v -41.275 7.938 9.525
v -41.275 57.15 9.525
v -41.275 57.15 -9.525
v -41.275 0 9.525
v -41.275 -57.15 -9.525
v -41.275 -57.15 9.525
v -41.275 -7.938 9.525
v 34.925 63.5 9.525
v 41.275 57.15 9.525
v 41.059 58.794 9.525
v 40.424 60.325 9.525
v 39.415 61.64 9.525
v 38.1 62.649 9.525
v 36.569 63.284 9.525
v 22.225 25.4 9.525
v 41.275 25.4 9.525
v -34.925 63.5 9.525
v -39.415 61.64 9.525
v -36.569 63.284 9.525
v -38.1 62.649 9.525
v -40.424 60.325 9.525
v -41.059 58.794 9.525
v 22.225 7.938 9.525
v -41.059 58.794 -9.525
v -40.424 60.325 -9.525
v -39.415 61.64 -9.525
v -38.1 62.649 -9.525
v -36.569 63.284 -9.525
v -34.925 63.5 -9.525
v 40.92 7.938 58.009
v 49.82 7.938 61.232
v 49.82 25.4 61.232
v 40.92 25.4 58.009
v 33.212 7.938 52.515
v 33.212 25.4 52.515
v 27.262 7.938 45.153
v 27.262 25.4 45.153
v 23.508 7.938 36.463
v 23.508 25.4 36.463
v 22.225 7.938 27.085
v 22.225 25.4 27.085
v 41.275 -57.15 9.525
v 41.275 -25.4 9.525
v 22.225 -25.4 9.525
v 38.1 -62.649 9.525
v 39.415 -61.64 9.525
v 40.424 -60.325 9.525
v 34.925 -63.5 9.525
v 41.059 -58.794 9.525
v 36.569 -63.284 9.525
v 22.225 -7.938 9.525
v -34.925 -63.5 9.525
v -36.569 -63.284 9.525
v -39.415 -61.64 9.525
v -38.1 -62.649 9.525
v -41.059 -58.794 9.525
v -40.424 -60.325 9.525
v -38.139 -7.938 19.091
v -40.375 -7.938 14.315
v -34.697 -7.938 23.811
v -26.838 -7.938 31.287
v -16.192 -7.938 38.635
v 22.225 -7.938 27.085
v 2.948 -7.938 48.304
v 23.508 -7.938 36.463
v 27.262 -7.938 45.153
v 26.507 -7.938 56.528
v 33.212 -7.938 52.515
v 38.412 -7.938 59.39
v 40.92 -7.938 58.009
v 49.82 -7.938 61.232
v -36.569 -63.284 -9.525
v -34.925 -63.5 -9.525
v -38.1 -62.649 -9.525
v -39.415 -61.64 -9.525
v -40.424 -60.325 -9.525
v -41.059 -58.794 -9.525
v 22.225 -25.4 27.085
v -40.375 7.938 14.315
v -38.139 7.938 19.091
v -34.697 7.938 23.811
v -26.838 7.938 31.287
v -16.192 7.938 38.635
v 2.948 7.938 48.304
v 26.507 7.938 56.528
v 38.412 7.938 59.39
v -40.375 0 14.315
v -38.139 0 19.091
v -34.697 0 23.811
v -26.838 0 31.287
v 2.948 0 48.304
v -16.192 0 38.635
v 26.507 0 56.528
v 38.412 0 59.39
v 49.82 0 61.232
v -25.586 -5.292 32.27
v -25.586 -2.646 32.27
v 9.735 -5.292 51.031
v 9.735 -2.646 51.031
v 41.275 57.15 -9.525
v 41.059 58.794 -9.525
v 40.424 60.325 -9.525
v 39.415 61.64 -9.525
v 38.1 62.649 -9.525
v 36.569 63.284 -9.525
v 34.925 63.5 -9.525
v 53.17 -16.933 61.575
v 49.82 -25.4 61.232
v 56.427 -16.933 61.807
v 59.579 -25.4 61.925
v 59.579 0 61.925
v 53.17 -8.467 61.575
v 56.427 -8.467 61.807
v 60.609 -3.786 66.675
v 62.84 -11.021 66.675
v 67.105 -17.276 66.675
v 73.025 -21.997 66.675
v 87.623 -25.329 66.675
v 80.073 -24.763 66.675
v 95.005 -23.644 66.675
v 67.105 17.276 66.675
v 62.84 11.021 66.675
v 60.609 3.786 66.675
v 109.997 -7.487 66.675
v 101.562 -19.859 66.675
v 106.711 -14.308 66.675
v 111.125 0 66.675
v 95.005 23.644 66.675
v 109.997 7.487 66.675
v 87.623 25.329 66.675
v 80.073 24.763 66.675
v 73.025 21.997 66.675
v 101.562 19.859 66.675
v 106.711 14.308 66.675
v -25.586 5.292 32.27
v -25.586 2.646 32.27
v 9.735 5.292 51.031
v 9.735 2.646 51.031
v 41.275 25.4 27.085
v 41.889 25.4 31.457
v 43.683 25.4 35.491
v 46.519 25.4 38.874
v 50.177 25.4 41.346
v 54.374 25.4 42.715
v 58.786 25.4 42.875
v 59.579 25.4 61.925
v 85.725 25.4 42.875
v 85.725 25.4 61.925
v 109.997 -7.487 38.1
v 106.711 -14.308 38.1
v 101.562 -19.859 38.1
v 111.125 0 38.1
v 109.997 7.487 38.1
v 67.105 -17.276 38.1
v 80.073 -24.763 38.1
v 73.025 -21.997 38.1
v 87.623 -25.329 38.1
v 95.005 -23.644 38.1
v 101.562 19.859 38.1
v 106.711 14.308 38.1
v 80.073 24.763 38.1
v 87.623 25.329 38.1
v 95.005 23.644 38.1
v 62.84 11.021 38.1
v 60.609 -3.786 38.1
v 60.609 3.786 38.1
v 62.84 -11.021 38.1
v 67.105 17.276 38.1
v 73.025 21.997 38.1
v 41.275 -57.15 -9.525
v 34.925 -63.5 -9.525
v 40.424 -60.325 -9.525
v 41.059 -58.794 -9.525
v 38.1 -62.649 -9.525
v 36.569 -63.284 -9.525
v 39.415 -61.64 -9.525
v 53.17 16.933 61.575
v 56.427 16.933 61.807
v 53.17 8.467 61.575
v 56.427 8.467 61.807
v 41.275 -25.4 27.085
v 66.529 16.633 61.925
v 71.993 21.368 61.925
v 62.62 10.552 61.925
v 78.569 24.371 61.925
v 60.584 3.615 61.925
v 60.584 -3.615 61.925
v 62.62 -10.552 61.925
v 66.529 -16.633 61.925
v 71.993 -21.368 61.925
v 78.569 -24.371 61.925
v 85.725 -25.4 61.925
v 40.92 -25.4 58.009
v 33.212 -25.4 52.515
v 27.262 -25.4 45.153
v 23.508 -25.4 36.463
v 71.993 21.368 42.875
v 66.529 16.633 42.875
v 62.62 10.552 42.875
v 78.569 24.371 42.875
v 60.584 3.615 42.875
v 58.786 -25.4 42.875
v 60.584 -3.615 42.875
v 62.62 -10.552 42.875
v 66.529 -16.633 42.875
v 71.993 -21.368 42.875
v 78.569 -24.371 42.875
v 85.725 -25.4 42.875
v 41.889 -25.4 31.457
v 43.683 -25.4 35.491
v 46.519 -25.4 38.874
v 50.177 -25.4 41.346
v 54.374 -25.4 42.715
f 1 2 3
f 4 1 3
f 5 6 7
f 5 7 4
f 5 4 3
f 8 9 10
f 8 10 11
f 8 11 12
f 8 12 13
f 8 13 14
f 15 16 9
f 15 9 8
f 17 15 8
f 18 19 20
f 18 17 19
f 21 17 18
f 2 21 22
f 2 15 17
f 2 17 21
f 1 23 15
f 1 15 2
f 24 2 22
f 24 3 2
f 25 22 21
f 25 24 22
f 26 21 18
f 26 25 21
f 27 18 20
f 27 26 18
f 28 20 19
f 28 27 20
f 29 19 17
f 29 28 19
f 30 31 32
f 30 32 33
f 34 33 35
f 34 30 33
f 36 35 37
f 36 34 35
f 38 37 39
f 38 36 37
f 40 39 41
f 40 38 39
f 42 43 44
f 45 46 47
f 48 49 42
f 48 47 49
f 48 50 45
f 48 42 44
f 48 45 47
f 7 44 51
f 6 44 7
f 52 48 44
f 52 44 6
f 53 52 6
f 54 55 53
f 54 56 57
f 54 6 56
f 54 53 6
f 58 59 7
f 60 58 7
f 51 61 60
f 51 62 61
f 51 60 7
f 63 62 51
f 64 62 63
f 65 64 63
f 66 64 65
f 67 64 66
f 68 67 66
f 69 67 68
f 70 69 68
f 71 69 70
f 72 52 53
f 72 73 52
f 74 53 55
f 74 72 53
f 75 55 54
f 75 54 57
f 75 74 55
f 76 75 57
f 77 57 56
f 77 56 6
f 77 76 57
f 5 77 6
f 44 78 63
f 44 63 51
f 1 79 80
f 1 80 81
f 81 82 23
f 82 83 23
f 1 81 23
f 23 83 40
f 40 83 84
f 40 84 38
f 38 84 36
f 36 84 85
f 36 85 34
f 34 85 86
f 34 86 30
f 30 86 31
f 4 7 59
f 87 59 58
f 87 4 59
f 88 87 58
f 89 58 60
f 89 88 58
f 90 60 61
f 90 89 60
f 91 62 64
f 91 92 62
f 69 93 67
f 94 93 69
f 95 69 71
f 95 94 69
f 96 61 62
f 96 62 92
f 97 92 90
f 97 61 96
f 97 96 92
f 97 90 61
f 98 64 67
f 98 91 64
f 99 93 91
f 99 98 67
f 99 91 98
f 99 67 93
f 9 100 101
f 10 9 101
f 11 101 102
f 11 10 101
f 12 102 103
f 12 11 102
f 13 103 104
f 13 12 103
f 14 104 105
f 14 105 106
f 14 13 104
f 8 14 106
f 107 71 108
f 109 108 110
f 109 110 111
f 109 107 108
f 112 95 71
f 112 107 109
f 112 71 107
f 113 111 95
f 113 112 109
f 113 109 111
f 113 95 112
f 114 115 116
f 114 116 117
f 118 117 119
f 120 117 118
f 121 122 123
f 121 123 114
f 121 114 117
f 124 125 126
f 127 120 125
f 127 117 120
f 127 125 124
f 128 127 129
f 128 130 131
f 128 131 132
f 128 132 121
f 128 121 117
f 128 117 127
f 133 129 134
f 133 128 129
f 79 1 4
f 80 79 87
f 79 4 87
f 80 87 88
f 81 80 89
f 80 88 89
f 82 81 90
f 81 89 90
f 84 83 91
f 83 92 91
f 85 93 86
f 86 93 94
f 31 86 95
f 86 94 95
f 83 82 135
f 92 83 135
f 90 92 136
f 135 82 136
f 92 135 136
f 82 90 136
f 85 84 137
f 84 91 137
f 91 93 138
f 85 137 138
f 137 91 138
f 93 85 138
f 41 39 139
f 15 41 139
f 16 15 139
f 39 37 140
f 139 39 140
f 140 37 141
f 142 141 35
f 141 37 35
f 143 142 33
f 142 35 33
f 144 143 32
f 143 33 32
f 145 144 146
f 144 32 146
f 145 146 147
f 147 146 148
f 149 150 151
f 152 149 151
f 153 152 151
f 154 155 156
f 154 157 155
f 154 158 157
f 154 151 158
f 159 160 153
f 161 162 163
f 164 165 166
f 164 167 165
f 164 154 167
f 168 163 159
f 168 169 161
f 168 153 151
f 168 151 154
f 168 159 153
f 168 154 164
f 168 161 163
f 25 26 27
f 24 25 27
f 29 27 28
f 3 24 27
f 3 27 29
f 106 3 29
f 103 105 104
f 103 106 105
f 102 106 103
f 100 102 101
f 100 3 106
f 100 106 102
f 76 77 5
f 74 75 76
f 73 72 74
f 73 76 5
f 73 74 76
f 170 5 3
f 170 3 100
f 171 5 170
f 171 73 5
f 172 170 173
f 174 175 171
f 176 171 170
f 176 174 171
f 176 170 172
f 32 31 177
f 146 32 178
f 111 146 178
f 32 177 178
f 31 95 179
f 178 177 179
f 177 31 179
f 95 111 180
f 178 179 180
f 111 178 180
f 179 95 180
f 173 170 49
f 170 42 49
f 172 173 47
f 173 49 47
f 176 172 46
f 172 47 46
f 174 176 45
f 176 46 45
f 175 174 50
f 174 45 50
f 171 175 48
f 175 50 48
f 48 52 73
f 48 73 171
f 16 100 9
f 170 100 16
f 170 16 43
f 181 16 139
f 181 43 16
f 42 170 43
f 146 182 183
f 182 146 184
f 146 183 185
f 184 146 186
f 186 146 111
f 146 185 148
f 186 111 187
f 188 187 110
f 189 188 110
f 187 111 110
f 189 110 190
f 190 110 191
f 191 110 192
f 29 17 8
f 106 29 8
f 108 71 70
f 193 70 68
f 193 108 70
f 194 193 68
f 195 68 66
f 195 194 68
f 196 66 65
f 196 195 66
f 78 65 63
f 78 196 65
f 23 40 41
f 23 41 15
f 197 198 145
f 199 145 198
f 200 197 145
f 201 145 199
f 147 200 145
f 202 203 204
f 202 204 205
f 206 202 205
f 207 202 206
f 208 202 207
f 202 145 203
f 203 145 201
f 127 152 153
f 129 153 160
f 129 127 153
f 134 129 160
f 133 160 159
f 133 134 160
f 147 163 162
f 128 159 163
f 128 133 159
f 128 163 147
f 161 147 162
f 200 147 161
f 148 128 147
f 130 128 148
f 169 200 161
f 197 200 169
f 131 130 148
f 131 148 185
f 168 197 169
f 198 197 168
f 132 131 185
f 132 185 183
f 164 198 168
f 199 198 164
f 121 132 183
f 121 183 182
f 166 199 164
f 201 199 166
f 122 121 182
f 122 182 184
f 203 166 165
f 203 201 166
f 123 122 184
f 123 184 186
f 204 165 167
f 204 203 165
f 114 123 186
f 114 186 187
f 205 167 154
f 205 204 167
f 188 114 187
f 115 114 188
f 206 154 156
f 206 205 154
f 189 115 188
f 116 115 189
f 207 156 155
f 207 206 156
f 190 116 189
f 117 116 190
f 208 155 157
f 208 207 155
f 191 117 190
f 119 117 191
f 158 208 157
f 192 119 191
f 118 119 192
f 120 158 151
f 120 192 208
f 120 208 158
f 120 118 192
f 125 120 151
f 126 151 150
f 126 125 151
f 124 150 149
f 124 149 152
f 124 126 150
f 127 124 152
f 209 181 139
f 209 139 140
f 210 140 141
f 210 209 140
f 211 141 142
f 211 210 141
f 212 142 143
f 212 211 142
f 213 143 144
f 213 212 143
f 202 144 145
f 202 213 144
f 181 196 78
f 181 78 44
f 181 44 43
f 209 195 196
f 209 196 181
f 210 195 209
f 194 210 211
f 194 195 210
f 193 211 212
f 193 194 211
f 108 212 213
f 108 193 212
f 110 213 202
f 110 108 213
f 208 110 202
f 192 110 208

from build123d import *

# Parameters (mm, degrees)
F1_DEPTH = 25.4
F2_DEPTH = 7.9375
F3_DEPTH = 63.5
F0_W     = 25.4
F0_H     = 19.05
F4_DEPTH = 25.4
F6_R     = 6.35


with BuildPart() as f1:
    # F0 (on Front) → F1 (new body, symmetric)
    with BuildSketch(Plane.XZ):
        with BuildLine():
            Line((22.225, 9.525), (41.275, 9.525))
            Line((41.275, 9.525), (41.275, 27.0847757391))
            ThreePointArc((41.275, 27.0847757391), (46.5190025255, 38.8744965881), (58.7864982926, 42.8752))
            Line((58.7864982926, 42.8752), (60.325, 42.8752))
            Line((60.325, 42.8752), (60.325, 61.9252))
            Line((60.325, 61.9252), (59.579086726, 61.9252))
            add(Edge.make_bspline(
                [(49.820043734, 61.2319186085), (53.2136012382, 61.6294074654), (56.4831276325, 61.8655861507), (59.5790867259, 61.9252)],
                knots=[104.2253932415, 104.2253932415, 104.2253932415, 104.2253932415, 113.6544225684, 113.6544225684, 113.6544225684, 113.6544225684], degree=3))
            ThreePointArc((49.820043734, 61.2319186085), (29.9861053272, 49.0365057667), (22.225, 27.0847757391))
            Line((22.225, 27.0847757391), (22.225, 9.525))
        make_face()
    extrude(amount=F1_DEPTH, both=True)

    # F0 (on Front) → F2 (join, symmetric)
    with BuildSketch(Plane.XZ):
        with BuildLine():
            Line((-41.275, 9.525), (22.225, 9.525))
            Line((22.225, 9.525), (22.225, 27.0847757391))
            ThreePointArc((22.225, 27.0847757391), (29.9861053272, 49.0365057667), (49.820043734, 61.2319186085))
            add(Edge.make_bspline(
                [(-41.275, 9.525), (-40.3570706701, 32.7350297492), (12.3087736869, 56.838207338), (49.820043734, 61.2319186085)],
                knots=[0, 0, 0, 0, 104.2253932415, 104.2253932415, 104.2253932415, 104.2253932415], degree=3))
        make_face()
    extrude(amount=F2_DEPTH, both=True)

    # F0 (on Front) → F3 (join, symmetric)
    with BuildSketch(Plane.XZ):
        Polygon((41.275, -9.525), (41.275, 9.525), (22.225, 9.525), (-41.275, 9.525), (-41.275, -9.525), align=None)
    extrude(amount=F3_DEPTH, both=True)

    # F0 (on Front) → F4 (join, symmetric)
    with BuildSketch(Plane.XZ):
        with Locations((73.025, 52.4002)):
            Rectangle(F0_W, F0_H)
    extrude(amount=F4_DEPTH, both=True)

    # F0 (on Front) → F5 (revolve)
    with BuildSketch(Plane.XZ):
        Polygon((85.725, 61.9252), (85.725, 42.8752), (85.725, 38.1), (111.125, 38.1), (111.125, 66.675), (85.725, 66.675), align=None)
    revolve(axis=Axis((85.725, 0, 54.7751), (0, 0, 1)))

    # F6
    f6_edges = [f1.edges().sort_by_distance(p)[0] for p in [
        (-41.275, -63.5, 0),
        (41.275, -63.5, 0),
        (-41.275, 63.5, 0),
        (41.275, 63.5, 0),
    ]]
    fillet(f6_edges, radius=F6_R)


solid = f1.part
